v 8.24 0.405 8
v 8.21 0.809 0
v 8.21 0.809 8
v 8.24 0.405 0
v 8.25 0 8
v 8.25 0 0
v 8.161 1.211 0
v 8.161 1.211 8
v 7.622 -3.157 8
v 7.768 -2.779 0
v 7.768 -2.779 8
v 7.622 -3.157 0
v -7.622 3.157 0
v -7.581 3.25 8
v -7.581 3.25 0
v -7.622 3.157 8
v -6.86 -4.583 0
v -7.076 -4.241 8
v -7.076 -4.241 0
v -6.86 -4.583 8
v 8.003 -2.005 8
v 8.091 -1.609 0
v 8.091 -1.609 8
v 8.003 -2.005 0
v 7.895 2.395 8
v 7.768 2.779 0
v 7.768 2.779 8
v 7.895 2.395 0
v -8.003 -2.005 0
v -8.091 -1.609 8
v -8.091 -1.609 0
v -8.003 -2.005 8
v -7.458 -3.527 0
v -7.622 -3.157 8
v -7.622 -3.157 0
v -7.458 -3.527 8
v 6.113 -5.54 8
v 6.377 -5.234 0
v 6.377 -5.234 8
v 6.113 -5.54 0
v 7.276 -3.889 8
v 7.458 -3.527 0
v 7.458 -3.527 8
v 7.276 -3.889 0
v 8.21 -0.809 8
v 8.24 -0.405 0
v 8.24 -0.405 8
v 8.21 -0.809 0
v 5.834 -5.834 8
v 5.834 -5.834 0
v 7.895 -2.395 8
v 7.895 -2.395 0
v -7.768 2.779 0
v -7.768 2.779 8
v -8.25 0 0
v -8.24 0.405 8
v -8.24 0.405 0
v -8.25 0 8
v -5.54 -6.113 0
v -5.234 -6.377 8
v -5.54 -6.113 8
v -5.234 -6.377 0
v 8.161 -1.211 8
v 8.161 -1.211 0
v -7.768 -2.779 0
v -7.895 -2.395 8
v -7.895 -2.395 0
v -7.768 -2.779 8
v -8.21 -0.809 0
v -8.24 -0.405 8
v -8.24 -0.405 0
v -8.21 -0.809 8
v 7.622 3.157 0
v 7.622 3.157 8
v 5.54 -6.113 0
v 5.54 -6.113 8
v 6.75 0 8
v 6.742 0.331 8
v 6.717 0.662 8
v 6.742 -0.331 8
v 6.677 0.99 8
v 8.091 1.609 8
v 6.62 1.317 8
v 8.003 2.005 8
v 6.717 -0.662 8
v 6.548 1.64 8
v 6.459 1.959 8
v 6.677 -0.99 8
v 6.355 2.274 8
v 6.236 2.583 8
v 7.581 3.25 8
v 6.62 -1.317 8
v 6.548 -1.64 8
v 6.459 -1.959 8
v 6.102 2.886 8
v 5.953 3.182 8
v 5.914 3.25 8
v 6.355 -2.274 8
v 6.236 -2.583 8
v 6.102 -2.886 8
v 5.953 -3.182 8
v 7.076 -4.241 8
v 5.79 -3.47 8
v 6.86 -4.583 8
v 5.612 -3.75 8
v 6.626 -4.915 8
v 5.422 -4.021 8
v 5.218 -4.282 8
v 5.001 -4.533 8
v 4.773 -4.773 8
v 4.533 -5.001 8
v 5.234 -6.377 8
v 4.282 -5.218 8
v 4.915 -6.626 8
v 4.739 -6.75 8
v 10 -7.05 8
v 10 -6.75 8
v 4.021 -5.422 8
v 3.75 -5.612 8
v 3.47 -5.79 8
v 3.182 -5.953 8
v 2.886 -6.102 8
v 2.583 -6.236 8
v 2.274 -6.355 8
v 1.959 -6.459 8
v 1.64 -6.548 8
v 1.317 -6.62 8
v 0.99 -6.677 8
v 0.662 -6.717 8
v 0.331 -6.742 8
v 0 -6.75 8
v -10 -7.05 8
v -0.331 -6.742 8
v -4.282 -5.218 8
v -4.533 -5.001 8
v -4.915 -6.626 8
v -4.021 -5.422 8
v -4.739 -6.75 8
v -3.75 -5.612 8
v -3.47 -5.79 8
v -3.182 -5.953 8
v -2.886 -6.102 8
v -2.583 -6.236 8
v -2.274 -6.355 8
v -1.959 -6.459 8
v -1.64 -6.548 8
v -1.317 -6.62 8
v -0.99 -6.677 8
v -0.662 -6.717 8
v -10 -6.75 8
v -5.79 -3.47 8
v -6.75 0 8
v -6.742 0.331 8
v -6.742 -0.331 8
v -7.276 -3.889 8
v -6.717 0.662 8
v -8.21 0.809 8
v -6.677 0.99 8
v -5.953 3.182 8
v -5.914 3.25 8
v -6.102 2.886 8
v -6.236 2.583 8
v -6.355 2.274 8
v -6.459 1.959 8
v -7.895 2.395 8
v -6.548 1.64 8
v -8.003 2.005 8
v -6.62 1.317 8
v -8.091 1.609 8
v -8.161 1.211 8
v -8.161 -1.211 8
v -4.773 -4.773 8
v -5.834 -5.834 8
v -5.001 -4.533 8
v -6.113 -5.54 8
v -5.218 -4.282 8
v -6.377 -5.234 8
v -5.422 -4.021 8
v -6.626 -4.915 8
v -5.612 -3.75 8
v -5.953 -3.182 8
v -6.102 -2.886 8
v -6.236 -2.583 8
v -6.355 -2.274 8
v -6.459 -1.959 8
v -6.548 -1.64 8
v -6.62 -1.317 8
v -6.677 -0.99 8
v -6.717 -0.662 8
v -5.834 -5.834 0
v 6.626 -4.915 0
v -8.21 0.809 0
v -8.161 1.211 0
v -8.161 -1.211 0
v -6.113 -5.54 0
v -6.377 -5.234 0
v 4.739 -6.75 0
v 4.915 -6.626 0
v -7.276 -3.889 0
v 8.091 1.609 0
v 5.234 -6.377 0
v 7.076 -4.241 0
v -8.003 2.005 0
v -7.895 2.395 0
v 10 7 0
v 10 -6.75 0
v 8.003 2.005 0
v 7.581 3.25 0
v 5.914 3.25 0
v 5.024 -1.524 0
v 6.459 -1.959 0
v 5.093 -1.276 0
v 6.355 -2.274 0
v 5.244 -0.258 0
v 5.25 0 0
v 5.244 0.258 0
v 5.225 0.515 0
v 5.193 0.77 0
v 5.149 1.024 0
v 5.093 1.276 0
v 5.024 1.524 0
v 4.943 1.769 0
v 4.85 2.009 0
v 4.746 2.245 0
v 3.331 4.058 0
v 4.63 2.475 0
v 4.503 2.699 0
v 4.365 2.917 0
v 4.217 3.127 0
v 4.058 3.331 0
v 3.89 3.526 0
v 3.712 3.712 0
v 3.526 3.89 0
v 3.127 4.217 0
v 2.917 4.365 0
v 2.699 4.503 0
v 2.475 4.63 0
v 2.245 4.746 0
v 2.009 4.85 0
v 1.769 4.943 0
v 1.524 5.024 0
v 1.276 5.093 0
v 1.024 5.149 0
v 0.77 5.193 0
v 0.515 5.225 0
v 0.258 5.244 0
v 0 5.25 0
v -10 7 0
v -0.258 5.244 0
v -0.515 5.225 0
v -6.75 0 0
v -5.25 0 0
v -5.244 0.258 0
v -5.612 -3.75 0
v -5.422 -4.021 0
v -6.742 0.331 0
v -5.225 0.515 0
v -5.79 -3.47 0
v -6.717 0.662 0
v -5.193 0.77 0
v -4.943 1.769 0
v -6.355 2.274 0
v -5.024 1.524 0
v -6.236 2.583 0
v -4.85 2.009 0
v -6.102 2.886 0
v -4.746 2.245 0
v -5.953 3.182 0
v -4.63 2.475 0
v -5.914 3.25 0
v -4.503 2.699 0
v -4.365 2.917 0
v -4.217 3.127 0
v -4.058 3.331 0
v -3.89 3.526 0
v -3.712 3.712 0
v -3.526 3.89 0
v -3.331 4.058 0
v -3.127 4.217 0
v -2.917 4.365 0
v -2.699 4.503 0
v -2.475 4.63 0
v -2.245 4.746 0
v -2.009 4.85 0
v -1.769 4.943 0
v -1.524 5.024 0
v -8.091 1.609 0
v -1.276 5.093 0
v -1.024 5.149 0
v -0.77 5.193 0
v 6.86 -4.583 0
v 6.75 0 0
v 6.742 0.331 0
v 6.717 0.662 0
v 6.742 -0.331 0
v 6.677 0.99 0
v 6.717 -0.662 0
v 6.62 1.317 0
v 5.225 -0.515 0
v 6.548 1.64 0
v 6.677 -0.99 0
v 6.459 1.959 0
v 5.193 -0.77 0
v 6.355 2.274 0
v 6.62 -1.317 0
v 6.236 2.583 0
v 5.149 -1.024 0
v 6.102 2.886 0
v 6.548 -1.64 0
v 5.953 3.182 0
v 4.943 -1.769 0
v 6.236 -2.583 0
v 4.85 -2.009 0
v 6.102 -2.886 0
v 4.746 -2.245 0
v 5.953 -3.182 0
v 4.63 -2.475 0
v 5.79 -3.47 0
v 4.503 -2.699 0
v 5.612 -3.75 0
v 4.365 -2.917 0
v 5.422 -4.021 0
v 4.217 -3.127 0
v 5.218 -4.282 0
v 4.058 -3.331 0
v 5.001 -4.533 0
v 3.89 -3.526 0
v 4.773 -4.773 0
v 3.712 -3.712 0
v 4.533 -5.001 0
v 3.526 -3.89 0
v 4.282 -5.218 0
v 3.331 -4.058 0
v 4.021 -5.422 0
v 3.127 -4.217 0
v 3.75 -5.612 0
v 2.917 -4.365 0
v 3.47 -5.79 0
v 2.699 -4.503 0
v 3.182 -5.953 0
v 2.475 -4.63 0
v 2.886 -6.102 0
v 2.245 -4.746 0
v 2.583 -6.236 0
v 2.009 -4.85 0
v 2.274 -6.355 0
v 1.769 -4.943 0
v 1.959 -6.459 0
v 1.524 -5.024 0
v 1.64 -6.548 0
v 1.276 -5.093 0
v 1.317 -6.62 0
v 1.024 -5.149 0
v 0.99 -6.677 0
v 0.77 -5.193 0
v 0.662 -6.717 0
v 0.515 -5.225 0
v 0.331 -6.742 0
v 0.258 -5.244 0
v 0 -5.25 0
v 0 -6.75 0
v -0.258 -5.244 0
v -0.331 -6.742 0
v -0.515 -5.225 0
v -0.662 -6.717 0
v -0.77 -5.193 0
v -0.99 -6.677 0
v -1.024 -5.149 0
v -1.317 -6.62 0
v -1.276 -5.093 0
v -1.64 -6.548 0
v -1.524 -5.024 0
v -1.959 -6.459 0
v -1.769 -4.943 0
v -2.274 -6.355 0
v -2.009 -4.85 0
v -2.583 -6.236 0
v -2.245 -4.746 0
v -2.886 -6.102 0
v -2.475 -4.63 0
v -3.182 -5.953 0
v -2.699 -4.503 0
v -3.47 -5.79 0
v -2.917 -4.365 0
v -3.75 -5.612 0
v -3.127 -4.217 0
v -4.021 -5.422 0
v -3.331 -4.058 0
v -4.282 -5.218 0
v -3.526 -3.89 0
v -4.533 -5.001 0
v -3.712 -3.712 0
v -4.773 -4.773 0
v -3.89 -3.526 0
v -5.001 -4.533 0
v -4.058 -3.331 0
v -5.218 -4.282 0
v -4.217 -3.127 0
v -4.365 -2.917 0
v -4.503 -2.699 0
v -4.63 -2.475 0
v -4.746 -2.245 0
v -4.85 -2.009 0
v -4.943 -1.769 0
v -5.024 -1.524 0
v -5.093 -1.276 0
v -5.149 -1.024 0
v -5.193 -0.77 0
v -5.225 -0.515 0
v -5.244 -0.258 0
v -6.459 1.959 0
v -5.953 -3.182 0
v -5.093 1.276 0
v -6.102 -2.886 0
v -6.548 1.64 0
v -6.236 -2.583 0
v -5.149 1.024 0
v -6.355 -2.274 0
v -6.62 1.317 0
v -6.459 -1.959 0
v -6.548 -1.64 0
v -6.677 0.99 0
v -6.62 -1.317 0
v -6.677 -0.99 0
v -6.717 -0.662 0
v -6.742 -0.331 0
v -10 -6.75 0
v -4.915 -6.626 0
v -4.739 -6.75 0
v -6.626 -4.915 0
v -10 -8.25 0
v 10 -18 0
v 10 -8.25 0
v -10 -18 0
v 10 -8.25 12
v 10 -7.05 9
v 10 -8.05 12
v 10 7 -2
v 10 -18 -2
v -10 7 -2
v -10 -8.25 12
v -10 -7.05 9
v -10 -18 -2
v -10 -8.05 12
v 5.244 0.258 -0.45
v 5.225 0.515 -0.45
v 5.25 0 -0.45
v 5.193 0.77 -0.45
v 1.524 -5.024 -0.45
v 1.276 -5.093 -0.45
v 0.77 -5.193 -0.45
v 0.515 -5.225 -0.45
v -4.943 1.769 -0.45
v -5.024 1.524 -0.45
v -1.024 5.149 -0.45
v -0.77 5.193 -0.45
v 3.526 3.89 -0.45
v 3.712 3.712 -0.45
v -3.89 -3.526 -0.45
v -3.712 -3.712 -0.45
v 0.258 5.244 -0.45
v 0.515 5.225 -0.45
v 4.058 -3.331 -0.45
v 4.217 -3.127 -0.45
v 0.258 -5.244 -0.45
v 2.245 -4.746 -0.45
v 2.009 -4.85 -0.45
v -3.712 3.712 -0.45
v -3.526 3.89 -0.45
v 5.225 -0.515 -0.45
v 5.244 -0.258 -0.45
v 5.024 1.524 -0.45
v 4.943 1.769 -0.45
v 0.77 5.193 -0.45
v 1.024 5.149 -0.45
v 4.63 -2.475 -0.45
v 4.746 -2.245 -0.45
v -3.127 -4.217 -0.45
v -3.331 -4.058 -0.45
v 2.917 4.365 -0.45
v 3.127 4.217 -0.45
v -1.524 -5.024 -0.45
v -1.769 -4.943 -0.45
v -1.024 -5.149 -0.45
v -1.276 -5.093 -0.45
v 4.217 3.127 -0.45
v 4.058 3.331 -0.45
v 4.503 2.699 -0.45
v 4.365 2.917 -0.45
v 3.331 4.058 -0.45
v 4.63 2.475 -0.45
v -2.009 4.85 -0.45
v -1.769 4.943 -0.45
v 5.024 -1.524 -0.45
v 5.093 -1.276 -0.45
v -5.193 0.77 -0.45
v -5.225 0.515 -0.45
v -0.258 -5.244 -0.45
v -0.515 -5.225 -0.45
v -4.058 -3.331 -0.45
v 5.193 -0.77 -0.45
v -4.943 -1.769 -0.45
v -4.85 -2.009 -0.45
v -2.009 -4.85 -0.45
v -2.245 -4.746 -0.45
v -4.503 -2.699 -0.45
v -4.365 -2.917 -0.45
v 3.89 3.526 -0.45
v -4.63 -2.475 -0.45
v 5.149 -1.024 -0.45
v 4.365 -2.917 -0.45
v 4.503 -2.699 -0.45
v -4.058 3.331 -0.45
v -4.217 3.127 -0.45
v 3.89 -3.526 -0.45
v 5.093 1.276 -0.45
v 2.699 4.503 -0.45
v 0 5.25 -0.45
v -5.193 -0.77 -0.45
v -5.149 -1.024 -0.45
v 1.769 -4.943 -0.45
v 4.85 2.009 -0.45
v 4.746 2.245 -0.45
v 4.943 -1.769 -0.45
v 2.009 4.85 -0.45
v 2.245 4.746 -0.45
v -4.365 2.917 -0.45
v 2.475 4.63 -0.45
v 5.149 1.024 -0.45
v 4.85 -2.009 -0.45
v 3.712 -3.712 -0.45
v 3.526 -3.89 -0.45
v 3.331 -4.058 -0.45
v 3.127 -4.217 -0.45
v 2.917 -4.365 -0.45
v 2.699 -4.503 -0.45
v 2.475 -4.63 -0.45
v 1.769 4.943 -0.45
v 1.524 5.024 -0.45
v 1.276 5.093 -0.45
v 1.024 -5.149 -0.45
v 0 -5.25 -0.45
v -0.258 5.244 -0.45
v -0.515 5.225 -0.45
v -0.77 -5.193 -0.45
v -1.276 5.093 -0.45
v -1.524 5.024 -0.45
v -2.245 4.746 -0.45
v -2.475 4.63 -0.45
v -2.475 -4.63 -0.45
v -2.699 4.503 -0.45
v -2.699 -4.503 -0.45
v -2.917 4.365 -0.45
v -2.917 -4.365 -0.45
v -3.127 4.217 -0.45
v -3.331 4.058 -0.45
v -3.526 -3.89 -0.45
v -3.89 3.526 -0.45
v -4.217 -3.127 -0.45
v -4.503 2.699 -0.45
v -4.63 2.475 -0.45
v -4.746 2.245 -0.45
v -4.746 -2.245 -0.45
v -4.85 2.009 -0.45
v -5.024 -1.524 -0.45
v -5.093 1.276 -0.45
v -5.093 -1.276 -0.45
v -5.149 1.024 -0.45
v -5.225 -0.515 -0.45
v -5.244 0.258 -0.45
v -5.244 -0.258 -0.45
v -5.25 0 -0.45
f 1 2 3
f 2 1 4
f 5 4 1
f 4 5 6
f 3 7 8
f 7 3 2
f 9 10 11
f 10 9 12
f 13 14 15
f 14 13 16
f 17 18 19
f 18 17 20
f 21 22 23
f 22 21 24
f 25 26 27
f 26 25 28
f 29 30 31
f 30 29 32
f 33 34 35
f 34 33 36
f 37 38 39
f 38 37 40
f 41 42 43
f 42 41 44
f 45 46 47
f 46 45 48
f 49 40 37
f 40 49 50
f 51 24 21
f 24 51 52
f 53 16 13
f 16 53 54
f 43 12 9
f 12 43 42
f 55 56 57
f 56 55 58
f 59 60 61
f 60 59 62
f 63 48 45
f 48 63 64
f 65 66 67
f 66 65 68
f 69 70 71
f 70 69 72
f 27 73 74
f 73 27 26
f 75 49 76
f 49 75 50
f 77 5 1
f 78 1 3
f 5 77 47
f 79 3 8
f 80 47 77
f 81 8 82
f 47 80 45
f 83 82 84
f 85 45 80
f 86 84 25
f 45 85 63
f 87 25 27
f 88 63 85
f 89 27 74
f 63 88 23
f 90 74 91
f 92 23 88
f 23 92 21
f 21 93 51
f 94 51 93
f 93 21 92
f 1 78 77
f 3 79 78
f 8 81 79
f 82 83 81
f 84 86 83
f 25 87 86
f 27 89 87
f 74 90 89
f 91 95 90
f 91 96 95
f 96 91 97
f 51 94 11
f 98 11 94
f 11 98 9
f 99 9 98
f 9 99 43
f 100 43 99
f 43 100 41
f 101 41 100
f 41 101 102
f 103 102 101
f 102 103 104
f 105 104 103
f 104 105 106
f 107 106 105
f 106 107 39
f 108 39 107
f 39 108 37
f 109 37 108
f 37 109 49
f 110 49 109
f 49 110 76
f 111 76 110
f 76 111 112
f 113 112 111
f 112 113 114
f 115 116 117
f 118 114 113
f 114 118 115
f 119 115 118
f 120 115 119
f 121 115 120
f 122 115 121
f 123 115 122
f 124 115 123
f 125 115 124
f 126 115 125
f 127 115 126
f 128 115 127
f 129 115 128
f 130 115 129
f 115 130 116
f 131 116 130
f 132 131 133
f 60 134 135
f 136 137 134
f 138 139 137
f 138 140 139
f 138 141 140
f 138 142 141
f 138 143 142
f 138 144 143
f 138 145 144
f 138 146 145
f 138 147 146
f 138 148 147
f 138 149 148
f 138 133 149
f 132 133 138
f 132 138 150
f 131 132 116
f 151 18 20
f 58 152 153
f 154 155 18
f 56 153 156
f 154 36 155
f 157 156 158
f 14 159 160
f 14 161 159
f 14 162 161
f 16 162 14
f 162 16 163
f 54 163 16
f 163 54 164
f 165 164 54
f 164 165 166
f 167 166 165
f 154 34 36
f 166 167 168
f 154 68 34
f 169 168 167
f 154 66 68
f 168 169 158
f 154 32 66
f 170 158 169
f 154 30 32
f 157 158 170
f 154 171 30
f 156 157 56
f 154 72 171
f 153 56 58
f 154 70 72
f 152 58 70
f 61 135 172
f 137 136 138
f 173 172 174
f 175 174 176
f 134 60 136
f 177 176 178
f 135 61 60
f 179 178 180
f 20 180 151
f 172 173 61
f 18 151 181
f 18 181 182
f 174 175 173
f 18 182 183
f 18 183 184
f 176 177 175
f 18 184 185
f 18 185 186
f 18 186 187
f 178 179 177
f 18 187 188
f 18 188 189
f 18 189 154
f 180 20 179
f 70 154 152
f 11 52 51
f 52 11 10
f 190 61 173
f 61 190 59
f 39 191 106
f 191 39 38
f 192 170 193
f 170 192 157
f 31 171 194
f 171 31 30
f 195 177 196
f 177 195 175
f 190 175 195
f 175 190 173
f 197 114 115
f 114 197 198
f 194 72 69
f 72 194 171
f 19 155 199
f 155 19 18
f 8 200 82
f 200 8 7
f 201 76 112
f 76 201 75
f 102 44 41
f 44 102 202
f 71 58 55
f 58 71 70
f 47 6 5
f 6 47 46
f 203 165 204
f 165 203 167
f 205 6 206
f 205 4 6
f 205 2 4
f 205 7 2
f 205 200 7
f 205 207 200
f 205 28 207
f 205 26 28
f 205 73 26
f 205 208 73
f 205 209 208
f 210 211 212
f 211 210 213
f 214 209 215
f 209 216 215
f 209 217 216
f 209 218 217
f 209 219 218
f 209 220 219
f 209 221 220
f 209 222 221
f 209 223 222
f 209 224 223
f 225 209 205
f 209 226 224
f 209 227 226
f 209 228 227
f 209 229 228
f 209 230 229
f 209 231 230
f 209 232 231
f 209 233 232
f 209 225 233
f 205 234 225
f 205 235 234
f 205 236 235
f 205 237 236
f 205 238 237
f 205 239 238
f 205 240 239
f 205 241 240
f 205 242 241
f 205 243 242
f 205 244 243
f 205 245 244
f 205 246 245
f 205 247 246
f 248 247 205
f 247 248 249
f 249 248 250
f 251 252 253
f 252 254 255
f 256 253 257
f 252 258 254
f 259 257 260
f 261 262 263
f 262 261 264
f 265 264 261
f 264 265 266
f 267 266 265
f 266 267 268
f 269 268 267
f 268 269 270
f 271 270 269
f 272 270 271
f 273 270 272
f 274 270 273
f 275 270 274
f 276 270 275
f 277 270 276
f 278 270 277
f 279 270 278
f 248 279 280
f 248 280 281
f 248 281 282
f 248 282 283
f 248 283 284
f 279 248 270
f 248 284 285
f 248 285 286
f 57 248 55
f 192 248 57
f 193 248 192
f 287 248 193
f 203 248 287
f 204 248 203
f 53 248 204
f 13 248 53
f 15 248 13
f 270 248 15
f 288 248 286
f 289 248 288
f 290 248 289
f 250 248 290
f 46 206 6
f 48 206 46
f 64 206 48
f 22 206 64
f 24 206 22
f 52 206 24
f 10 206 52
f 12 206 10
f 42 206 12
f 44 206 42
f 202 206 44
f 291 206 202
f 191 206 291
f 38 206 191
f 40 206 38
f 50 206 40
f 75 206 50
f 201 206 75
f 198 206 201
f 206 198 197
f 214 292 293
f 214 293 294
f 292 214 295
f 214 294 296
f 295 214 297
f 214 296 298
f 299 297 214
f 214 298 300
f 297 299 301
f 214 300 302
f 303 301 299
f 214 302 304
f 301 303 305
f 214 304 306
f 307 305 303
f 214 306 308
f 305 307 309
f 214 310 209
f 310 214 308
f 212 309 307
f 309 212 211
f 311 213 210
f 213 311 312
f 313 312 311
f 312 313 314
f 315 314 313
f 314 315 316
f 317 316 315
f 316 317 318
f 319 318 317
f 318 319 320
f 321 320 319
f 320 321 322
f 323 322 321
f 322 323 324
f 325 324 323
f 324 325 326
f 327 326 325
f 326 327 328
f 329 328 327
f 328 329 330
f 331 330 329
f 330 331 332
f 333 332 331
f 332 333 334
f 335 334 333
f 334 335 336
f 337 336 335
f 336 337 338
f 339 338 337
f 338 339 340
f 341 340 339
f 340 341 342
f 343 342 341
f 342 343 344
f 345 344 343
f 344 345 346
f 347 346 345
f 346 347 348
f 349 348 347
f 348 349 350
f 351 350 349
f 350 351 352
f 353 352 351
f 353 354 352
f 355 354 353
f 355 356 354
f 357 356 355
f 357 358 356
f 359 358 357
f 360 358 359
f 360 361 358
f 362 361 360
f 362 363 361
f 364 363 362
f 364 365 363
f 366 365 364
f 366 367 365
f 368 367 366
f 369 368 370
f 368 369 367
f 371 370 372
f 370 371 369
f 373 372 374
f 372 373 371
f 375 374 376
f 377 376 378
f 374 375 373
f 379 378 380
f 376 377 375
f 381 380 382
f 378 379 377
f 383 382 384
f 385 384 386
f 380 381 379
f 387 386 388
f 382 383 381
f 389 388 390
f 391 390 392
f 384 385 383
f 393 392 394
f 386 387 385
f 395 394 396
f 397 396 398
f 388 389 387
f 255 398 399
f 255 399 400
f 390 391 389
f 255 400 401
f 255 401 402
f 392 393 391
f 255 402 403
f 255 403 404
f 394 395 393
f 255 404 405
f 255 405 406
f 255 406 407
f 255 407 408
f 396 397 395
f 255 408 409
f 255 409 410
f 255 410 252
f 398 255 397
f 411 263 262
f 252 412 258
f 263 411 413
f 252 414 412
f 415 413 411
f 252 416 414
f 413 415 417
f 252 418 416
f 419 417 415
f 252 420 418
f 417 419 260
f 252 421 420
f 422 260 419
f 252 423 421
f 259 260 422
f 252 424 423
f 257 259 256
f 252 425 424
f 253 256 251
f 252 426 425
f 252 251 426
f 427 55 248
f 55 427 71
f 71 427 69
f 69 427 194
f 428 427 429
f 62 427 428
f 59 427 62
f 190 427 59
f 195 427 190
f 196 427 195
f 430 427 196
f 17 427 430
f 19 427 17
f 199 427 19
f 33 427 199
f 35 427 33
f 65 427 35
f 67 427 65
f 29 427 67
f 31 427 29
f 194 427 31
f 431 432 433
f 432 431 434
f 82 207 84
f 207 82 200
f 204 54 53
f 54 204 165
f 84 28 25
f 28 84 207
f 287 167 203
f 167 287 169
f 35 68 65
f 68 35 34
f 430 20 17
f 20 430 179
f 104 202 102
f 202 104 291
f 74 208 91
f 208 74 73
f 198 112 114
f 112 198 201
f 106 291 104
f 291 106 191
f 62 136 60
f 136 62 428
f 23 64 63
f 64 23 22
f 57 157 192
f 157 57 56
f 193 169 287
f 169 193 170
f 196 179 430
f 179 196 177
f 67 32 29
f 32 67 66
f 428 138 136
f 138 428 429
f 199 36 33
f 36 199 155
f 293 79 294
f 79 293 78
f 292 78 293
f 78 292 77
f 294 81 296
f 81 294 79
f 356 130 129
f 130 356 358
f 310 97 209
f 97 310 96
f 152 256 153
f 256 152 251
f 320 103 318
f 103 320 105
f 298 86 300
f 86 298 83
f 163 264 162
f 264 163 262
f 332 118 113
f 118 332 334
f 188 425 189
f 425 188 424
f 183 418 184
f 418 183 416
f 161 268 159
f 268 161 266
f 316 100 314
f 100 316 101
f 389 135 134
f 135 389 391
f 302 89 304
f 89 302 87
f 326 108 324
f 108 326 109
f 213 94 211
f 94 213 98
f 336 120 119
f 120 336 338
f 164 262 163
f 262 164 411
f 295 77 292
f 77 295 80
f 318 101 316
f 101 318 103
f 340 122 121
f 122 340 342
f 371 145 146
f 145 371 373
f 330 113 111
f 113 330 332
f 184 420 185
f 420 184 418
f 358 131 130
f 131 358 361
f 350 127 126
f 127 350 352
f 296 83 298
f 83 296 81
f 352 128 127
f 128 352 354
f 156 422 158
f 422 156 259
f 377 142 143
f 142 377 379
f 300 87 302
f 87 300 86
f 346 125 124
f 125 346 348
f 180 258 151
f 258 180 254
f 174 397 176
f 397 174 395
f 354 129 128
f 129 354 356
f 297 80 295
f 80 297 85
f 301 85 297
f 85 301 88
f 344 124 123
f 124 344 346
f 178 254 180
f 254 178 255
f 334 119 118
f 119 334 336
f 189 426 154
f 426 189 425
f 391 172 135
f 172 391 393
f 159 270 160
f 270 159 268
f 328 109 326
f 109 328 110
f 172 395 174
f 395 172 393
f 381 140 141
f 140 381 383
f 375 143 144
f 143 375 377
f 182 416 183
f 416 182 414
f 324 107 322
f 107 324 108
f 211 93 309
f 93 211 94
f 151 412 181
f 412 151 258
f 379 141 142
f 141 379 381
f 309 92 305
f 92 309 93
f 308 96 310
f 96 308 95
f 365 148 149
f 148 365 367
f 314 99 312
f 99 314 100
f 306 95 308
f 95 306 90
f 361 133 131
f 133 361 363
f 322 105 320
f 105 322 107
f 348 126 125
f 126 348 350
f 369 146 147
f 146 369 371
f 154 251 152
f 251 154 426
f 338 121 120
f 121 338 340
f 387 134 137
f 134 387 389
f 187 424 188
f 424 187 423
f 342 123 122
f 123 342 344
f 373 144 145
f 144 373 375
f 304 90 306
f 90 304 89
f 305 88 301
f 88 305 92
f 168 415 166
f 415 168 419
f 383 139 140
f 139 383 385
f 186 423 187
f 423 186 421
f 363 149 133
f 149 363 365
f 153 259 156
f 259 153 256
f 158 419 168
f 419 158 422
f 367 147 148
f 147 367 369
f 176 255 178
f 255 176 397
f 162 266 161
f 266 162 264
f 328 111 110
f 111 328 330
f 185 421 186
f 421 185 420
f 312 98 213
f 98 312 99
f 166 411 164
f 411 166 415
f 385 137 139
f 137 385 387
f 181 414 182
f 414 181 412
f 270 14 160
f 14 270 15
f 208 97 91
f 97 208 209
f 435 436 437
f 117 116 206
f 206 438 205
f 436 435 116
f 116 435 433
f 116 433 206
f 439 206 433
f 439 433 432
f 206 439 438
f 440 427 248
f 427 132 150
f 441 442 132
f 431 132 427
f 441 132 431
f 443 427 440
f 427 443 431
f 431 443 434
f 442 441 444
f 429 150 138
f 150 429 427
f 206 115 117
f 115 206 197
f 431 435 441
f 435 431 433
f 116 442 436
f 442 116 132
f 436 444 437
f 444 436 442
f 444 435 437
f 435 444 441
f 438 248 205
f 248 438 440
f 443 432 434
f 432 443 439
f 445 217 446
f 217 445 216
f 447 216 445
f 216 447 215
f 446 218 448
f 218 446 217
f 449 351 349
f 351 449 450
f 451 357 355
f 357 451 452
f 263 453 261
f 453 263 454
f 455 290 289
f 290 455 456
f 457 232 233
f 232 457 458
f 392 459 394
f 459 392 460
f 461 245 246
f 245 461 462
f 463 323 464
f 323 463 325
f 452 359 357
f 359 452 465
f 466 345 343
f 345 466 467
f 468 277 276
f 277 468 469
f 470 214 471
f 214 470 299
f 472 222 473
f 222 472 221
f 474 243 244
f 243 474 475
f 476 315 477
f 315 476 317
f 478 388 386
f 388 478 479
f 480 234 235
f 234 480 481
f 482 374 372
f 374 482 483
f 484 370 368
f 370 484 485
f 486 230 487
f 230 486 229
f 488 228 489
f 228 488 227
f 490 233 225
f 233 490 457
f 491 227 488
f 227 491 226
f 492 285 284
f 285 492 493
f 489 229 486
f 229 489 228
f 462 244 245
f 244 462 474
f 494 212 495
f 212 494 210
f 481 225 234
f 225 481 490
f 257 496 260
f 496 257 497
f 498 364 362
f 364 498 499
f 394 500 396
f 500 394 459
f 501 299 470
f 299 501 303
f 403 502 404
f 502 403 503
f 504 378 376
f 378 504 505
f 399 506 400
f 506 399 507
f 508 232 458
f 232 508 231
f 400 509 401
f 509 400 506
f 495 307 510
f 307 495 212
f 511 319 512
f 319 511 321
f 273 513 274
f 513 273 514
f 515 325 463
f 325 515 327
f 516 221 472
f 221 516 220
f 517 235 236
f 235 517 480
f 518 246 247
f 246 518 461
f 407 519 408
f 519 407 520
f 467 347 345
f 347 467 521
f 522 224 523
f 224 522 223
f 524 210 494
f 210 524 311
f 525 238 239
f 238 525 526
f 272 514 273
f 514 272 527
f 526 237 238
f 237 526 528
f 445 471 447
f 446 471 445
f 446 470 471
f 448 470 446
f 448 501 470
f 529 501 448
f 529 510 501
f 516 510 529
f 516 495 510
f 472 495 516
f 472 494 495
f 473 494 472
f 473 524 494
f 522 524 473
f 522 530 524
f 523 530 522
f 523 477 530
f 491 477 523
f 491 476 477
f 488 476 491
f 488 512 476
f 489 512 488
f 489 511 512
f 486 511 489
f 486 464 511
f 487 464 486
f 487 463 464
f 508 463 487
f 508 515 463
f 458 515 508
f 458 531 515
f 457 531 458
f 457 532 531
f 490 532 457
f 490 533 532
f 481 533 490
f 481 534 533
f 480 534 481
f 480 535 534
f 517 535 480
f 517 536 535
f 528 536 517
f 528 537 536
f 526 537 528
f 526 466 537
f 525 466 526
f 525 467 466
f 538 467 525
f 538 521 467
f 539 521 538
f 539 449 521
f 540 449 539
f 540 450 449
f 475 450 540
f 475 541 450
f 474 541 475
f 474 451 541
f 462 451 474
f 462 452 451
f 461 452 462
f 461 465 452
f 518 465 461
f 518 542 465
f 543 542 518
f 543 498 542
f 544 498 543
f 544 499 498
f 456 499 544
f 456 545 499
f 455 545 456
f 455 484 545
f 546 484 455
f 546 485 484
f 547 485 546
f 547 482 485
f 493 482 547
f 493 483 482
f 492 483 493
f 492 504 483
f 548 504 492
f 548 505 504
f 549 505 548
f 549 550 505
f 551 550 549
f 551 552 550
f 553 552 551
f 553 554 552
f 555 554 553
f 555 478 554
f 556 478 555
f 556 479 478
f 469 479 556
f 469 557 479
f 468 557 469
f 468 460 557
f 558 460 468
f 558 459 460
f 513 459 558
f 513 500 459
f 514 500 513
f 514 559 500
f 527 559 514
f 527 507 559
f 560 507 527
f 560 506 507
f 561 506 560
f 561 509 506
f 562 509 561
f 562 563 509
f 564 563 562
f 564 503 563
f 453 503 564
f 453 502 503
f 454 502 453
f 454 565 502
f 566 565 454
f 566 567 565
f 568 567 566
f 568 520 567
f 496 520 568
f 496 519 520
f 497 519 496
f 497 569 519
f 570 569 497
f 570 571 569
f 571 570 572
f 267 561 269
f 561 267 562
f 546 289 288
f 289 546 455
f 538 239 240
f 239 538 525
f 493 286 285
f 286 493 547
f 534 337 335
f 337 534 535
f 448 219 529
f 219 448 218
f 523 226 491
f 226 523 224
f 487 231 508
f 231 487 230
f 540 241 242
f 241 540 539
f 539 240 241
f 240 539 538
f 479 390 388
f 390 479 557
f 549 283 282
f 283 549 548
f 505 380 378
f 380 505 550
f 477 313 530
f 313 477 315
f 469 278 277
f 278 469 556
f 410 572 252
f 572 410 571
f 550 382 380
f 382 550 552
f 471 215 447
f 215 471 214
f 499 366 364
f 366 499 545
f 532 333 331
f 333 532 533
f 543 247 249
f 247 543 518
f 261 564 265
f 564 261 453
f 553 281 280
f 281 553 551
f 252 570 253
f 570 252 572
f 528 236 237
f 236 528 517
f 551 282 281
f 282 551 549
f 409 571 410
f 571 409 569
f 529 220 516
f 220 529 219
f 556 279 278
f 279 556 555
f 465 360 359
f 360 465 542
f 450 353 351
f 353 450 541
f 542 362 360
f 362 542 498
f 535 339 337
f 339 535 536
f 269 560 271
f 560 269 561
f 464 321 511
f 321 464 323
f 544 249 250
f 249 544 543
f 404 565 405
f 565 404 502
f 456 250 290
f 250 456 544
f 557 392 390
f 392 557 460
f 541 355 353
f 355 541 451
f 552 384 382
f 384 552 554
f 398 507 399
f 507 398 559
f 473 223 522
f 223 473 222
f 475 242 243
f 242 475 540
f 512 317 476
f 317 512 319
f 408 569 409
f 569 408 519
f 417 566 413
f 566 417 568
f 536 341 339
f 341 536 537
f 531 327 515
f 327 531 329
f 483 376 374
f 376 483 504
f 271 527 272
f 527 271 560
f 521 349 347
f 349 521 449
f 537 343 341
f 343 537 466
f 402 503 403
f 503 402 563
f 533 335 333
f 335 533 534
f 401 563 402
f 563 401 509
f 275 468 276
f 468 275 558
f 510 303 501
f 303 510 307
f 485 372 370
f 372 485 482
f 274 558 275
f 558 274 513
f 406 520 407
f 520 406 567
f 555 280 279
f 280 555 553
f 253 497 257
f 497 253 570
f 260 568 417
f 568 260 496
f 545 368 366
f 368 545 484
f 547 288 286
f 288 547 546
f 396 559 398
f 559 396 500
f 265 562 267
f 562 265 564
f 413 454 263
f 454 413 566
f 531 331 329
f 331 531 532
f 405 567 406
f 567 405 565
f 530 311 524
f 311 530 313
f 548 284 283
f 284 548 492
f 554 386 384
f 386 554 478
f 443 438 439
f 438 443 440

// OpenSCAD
// file: ../parts/train_integrity_body.scad
/* RailEduKit/InteractiveSignallingLaboratory © 2025 by Martin Scheidt and contributors
 * License: CC-BY 4.0 - https://creativecommons.org/licenses/by/4.0/
 * Project description: The Interactive Signalling Laboratory is a tool for training in Rail
 * Applications to enhance the knowledge of control and signalling principles for rail transport systems.
 *
 * Module: train_integrity_body
 */

// Include configuration file
include <../config/global_variables.scad>
include <../config/colors.scad>

module train_integrity_body() {
	color(BASE_COLOR) union(){
	difference() { // coupling
		// outer ring
		cylinder(h = coupling_depth, r = coupling_radius + move_tolerance / 2 + coupler_thickness);
		// inner ring
		translate([ 0, 0, -coupler_thickness / 2 ])
		cylinder(h = coupling_depth + coupler_thickness, r = coupling_radius + move_tolerance / 2);
		// cutting the lower edge
		translate([ -coupling_radius * 1.3, coupling_cut_pos, -coupler_thickness / 2 ])
		cube([ coupling_radius * 2.6, coupling_radius * 1.2, coupling_depth + coupler_thickness ]);
	}

	union() { // upper board
		// beam
		translate([ -boogie_width / 2, -(coupling_radius + coupler_thickness + move_tolerance / 2), 0 ])
		cube([ boogie_width, coupler_thickness, coupling_depth ]);
		// lipp
		hull() {
			translate([
				-boogie_width / 2, -(coupling_radius + move_tolerance / 2 + coupler_thickness - lipp_width),
				coupling_depth
			])
			cube([ boogie_width, thinnest_layer, lipp_height / 4 ]);
			translate(
			    [ -boogie_width / 2, -(coupling_radius + move_tolerance / 2 + coupler_thickness), coupling_depth ])
			cube([ boogie_width, thinnest_layer, lipp_height ]);
		}
	}

	difference() { // front shield
		translate([ -shield_width / 2, -(shield_depth) / 2 - coupling_radius + 1, -shield_thickness ]) 
		cube([ shield_width, shield_depth, shield_thickness ]);
		translate([ 0, 0, -inlay_thickness ])
		cylinder(h = inlay_thickness, r = inlay_radius);
	}
	}
}

//train_integrity_body();
// file: ../assemblies/train_integrity_symbol_rear.scad
/* RailEduKit/InteractiveSignallingLaboratory © 2025 by Martin Scheidt and contributors
 * License: CC-BY 4.0 - https://creativecommons.org/licenses/by/4.0/
 * Project description: The Interactive Signalling Laboratory is a tool for training in Rail
 * Applications to enhance the knowledge of control and signalling principles for rail transport systems.
 *
 * Module: train_integrity_symbol_rear
 */

// Include configuration file
include <../config/global_variables.scad>
include <../config/colors.scad>

/* PRINT INSTRUCTION
To print the train integrity you have to export the symbol and the body seperately as STL.
Then you have to select the body STL and the symbol STL and load them TOGETHER at the same time in Bambu Studio.
Thus the two files are positioned at the same place and the symbol fills the holes in the body perfectly.
Then you can select the two parts seperately to color them.
Through this procedure you can print multiple colors in one layer.
 */


module triangle() {
	cylinder_diameter = 0.1;
	hull() {
		translate([ cylinder_diameter / 2, cylinder_diameter / 2, 0 ])
		cylinder(d = cylinder_diameter, h = number_height);
		translate([ cylinder_diameter / 2, shield_depth - cylinder_diameter / 2, 0 ])
		cylinder(d = cylinder_diameter, h = number_height);
		translate([ (shield_width - cylinder_diameter) / 2, (shield_depth - cylinder_diameter) / 2, 0 ])
		cylinder(d = cylinder_diameter, h = number_height);
	}
}

module train_integrity_symbol_rear() {
	color(ASPECT_STOP) union(){
		translate([ -shield_width / 2, -(shield_depth) / 2 - coupling_radius + 1, -shield_thickness ])
		triangle();
		translate([ shield_width / 2, -(shield_depth) / 2 - coupling_radius + 1, -shield_thickness + number_height ])
		rotate([ 0, 180, 0 ])
		triangle();
	}
	
}

train_integrity_symbol_rear();
// file: ../assemblies/train_integrity_body_rear.scad
/* RailEduKit/InteractiveSignallingLaboratory © 2025 by Martin Scheidt and contributors
 * License: CC-BY 4.0 - https://creativecommons.org/licenses/by/4.0/
 * Project description: The Interactive Signalling Laboratory is a tool for training in Rail
 * Applications to enhance the knowledge of control and signalling principles for rail transport systems.
 *
 * Module: train_integrity_body_rear
 */

// Include configuration file
include <../config/global_variables.scad>

// include common parts
include <../parts/train_integrity_body.scad>
use <train_integrity_symbol_rear.scad>

/* PRINT INSTRUCTION
To print the train integrity you have to export the symbol and the body seperately as STL.
Then you have to select the body STL and the symbol STL and load them TOGETHER at the same time in Bambu Studio.
Thus the two files are positioned at the same place and the symbol fills the holes in the body perfectly.
Then you can select the two parts seperately to color them.
Through this procedure you can print multiple colors in one layer.
 */



module train_integrity_body_rear() {
	difference() {
        train_integrity_body();
        train_integrity_symbol_rear();
	}
}

train_integrity_body_rear();
// file: ../config/colors.scad
/* RailEduKit/InteractiveSignallingLaboratory © 2025 by Martin Scheidt and contributors
 * License: CC-BY 4.0 - https://creativecommons.org/licenses/by/4.0/
 * Project description: The Interactive Signalling Laboratory is a tool for training in Rail
 * Applications to enhance the knowledge of control and signalling principles for rail transport systems.
 *
 * Module: config/colors.scad
 */

// component colors
BASE_COLOR = [0.25, 0.25, 0.25];// lighter black to see the shapes
INDICATOR_COLOR = "white";
ROUTE_COLOR = [0.255, 0.412, 0.882]; //[0.396, 0.467, 0.702];

METALLIC_GREY = [0.474, 0.482, 0.482];



// signal colors
ASPECT_CLEAR = "green";
ASPECT_APPROACH = "yellow";
ASPECT_STOP = "red";
// main file
/* RailEduKit/InteractiveSignallingLaboratory © 2025 by Martin Scheidt and contributors
 * License: CC-BY 4.0 - https://creativecommons.org/licenses/by/4.0/
 * Project description: The Interactive Signalling Laboratory is a tool for training in Rail
 * Applications to enhance the knowledge of control and signalling principles for rail transport systems.
 *
 * Module: train_integrity_rear
 */

// Include configuration file
include <../config/global_variables.scad>
include <../config/colors.scad>

// use common parts
use <../assemblies/train_integrity_body_rear.scad>
use <../assemblies/train_integrity_symbol_rear.scad>

/* PRINT INSTRUCTION
To print the train integrity you have to export the symbol and the body seperately as STL.
Then you have to select the body STL and the symbol STL and load them TOGETHER at the same time in Bambu Studio.
Thus the two files are positioned at the same place and the symbol fills the holes in the body perfectly.
Then you can select the two parts seperately to color them.
Through this procedure you can print multiple colors in one layer.
 */

module train_integrity_rear(){
    difference(){
        train_integrity_body_rear();
        // create space for white triangles
        translate([ -shield_width / 2, -(shield_depth) / 2 - coupling_radius + 1, -shield_thickness ])
        cube([ shield_width, shield_depth, number_height ]);
    }
    difference(){
        // create white triangles
        color(INDICATOR_COLOR)
        translate([ -shield_width / 2, -(shield_depth) / 2 - coupling_radius + 1, -shield_thickness ])
        cube([ shield_width, shield_depth, number_height ]);
        train_integrity_symbol_rear();
    }
    train_integrity_symbol_rear();
}

train_integrity_rear();
